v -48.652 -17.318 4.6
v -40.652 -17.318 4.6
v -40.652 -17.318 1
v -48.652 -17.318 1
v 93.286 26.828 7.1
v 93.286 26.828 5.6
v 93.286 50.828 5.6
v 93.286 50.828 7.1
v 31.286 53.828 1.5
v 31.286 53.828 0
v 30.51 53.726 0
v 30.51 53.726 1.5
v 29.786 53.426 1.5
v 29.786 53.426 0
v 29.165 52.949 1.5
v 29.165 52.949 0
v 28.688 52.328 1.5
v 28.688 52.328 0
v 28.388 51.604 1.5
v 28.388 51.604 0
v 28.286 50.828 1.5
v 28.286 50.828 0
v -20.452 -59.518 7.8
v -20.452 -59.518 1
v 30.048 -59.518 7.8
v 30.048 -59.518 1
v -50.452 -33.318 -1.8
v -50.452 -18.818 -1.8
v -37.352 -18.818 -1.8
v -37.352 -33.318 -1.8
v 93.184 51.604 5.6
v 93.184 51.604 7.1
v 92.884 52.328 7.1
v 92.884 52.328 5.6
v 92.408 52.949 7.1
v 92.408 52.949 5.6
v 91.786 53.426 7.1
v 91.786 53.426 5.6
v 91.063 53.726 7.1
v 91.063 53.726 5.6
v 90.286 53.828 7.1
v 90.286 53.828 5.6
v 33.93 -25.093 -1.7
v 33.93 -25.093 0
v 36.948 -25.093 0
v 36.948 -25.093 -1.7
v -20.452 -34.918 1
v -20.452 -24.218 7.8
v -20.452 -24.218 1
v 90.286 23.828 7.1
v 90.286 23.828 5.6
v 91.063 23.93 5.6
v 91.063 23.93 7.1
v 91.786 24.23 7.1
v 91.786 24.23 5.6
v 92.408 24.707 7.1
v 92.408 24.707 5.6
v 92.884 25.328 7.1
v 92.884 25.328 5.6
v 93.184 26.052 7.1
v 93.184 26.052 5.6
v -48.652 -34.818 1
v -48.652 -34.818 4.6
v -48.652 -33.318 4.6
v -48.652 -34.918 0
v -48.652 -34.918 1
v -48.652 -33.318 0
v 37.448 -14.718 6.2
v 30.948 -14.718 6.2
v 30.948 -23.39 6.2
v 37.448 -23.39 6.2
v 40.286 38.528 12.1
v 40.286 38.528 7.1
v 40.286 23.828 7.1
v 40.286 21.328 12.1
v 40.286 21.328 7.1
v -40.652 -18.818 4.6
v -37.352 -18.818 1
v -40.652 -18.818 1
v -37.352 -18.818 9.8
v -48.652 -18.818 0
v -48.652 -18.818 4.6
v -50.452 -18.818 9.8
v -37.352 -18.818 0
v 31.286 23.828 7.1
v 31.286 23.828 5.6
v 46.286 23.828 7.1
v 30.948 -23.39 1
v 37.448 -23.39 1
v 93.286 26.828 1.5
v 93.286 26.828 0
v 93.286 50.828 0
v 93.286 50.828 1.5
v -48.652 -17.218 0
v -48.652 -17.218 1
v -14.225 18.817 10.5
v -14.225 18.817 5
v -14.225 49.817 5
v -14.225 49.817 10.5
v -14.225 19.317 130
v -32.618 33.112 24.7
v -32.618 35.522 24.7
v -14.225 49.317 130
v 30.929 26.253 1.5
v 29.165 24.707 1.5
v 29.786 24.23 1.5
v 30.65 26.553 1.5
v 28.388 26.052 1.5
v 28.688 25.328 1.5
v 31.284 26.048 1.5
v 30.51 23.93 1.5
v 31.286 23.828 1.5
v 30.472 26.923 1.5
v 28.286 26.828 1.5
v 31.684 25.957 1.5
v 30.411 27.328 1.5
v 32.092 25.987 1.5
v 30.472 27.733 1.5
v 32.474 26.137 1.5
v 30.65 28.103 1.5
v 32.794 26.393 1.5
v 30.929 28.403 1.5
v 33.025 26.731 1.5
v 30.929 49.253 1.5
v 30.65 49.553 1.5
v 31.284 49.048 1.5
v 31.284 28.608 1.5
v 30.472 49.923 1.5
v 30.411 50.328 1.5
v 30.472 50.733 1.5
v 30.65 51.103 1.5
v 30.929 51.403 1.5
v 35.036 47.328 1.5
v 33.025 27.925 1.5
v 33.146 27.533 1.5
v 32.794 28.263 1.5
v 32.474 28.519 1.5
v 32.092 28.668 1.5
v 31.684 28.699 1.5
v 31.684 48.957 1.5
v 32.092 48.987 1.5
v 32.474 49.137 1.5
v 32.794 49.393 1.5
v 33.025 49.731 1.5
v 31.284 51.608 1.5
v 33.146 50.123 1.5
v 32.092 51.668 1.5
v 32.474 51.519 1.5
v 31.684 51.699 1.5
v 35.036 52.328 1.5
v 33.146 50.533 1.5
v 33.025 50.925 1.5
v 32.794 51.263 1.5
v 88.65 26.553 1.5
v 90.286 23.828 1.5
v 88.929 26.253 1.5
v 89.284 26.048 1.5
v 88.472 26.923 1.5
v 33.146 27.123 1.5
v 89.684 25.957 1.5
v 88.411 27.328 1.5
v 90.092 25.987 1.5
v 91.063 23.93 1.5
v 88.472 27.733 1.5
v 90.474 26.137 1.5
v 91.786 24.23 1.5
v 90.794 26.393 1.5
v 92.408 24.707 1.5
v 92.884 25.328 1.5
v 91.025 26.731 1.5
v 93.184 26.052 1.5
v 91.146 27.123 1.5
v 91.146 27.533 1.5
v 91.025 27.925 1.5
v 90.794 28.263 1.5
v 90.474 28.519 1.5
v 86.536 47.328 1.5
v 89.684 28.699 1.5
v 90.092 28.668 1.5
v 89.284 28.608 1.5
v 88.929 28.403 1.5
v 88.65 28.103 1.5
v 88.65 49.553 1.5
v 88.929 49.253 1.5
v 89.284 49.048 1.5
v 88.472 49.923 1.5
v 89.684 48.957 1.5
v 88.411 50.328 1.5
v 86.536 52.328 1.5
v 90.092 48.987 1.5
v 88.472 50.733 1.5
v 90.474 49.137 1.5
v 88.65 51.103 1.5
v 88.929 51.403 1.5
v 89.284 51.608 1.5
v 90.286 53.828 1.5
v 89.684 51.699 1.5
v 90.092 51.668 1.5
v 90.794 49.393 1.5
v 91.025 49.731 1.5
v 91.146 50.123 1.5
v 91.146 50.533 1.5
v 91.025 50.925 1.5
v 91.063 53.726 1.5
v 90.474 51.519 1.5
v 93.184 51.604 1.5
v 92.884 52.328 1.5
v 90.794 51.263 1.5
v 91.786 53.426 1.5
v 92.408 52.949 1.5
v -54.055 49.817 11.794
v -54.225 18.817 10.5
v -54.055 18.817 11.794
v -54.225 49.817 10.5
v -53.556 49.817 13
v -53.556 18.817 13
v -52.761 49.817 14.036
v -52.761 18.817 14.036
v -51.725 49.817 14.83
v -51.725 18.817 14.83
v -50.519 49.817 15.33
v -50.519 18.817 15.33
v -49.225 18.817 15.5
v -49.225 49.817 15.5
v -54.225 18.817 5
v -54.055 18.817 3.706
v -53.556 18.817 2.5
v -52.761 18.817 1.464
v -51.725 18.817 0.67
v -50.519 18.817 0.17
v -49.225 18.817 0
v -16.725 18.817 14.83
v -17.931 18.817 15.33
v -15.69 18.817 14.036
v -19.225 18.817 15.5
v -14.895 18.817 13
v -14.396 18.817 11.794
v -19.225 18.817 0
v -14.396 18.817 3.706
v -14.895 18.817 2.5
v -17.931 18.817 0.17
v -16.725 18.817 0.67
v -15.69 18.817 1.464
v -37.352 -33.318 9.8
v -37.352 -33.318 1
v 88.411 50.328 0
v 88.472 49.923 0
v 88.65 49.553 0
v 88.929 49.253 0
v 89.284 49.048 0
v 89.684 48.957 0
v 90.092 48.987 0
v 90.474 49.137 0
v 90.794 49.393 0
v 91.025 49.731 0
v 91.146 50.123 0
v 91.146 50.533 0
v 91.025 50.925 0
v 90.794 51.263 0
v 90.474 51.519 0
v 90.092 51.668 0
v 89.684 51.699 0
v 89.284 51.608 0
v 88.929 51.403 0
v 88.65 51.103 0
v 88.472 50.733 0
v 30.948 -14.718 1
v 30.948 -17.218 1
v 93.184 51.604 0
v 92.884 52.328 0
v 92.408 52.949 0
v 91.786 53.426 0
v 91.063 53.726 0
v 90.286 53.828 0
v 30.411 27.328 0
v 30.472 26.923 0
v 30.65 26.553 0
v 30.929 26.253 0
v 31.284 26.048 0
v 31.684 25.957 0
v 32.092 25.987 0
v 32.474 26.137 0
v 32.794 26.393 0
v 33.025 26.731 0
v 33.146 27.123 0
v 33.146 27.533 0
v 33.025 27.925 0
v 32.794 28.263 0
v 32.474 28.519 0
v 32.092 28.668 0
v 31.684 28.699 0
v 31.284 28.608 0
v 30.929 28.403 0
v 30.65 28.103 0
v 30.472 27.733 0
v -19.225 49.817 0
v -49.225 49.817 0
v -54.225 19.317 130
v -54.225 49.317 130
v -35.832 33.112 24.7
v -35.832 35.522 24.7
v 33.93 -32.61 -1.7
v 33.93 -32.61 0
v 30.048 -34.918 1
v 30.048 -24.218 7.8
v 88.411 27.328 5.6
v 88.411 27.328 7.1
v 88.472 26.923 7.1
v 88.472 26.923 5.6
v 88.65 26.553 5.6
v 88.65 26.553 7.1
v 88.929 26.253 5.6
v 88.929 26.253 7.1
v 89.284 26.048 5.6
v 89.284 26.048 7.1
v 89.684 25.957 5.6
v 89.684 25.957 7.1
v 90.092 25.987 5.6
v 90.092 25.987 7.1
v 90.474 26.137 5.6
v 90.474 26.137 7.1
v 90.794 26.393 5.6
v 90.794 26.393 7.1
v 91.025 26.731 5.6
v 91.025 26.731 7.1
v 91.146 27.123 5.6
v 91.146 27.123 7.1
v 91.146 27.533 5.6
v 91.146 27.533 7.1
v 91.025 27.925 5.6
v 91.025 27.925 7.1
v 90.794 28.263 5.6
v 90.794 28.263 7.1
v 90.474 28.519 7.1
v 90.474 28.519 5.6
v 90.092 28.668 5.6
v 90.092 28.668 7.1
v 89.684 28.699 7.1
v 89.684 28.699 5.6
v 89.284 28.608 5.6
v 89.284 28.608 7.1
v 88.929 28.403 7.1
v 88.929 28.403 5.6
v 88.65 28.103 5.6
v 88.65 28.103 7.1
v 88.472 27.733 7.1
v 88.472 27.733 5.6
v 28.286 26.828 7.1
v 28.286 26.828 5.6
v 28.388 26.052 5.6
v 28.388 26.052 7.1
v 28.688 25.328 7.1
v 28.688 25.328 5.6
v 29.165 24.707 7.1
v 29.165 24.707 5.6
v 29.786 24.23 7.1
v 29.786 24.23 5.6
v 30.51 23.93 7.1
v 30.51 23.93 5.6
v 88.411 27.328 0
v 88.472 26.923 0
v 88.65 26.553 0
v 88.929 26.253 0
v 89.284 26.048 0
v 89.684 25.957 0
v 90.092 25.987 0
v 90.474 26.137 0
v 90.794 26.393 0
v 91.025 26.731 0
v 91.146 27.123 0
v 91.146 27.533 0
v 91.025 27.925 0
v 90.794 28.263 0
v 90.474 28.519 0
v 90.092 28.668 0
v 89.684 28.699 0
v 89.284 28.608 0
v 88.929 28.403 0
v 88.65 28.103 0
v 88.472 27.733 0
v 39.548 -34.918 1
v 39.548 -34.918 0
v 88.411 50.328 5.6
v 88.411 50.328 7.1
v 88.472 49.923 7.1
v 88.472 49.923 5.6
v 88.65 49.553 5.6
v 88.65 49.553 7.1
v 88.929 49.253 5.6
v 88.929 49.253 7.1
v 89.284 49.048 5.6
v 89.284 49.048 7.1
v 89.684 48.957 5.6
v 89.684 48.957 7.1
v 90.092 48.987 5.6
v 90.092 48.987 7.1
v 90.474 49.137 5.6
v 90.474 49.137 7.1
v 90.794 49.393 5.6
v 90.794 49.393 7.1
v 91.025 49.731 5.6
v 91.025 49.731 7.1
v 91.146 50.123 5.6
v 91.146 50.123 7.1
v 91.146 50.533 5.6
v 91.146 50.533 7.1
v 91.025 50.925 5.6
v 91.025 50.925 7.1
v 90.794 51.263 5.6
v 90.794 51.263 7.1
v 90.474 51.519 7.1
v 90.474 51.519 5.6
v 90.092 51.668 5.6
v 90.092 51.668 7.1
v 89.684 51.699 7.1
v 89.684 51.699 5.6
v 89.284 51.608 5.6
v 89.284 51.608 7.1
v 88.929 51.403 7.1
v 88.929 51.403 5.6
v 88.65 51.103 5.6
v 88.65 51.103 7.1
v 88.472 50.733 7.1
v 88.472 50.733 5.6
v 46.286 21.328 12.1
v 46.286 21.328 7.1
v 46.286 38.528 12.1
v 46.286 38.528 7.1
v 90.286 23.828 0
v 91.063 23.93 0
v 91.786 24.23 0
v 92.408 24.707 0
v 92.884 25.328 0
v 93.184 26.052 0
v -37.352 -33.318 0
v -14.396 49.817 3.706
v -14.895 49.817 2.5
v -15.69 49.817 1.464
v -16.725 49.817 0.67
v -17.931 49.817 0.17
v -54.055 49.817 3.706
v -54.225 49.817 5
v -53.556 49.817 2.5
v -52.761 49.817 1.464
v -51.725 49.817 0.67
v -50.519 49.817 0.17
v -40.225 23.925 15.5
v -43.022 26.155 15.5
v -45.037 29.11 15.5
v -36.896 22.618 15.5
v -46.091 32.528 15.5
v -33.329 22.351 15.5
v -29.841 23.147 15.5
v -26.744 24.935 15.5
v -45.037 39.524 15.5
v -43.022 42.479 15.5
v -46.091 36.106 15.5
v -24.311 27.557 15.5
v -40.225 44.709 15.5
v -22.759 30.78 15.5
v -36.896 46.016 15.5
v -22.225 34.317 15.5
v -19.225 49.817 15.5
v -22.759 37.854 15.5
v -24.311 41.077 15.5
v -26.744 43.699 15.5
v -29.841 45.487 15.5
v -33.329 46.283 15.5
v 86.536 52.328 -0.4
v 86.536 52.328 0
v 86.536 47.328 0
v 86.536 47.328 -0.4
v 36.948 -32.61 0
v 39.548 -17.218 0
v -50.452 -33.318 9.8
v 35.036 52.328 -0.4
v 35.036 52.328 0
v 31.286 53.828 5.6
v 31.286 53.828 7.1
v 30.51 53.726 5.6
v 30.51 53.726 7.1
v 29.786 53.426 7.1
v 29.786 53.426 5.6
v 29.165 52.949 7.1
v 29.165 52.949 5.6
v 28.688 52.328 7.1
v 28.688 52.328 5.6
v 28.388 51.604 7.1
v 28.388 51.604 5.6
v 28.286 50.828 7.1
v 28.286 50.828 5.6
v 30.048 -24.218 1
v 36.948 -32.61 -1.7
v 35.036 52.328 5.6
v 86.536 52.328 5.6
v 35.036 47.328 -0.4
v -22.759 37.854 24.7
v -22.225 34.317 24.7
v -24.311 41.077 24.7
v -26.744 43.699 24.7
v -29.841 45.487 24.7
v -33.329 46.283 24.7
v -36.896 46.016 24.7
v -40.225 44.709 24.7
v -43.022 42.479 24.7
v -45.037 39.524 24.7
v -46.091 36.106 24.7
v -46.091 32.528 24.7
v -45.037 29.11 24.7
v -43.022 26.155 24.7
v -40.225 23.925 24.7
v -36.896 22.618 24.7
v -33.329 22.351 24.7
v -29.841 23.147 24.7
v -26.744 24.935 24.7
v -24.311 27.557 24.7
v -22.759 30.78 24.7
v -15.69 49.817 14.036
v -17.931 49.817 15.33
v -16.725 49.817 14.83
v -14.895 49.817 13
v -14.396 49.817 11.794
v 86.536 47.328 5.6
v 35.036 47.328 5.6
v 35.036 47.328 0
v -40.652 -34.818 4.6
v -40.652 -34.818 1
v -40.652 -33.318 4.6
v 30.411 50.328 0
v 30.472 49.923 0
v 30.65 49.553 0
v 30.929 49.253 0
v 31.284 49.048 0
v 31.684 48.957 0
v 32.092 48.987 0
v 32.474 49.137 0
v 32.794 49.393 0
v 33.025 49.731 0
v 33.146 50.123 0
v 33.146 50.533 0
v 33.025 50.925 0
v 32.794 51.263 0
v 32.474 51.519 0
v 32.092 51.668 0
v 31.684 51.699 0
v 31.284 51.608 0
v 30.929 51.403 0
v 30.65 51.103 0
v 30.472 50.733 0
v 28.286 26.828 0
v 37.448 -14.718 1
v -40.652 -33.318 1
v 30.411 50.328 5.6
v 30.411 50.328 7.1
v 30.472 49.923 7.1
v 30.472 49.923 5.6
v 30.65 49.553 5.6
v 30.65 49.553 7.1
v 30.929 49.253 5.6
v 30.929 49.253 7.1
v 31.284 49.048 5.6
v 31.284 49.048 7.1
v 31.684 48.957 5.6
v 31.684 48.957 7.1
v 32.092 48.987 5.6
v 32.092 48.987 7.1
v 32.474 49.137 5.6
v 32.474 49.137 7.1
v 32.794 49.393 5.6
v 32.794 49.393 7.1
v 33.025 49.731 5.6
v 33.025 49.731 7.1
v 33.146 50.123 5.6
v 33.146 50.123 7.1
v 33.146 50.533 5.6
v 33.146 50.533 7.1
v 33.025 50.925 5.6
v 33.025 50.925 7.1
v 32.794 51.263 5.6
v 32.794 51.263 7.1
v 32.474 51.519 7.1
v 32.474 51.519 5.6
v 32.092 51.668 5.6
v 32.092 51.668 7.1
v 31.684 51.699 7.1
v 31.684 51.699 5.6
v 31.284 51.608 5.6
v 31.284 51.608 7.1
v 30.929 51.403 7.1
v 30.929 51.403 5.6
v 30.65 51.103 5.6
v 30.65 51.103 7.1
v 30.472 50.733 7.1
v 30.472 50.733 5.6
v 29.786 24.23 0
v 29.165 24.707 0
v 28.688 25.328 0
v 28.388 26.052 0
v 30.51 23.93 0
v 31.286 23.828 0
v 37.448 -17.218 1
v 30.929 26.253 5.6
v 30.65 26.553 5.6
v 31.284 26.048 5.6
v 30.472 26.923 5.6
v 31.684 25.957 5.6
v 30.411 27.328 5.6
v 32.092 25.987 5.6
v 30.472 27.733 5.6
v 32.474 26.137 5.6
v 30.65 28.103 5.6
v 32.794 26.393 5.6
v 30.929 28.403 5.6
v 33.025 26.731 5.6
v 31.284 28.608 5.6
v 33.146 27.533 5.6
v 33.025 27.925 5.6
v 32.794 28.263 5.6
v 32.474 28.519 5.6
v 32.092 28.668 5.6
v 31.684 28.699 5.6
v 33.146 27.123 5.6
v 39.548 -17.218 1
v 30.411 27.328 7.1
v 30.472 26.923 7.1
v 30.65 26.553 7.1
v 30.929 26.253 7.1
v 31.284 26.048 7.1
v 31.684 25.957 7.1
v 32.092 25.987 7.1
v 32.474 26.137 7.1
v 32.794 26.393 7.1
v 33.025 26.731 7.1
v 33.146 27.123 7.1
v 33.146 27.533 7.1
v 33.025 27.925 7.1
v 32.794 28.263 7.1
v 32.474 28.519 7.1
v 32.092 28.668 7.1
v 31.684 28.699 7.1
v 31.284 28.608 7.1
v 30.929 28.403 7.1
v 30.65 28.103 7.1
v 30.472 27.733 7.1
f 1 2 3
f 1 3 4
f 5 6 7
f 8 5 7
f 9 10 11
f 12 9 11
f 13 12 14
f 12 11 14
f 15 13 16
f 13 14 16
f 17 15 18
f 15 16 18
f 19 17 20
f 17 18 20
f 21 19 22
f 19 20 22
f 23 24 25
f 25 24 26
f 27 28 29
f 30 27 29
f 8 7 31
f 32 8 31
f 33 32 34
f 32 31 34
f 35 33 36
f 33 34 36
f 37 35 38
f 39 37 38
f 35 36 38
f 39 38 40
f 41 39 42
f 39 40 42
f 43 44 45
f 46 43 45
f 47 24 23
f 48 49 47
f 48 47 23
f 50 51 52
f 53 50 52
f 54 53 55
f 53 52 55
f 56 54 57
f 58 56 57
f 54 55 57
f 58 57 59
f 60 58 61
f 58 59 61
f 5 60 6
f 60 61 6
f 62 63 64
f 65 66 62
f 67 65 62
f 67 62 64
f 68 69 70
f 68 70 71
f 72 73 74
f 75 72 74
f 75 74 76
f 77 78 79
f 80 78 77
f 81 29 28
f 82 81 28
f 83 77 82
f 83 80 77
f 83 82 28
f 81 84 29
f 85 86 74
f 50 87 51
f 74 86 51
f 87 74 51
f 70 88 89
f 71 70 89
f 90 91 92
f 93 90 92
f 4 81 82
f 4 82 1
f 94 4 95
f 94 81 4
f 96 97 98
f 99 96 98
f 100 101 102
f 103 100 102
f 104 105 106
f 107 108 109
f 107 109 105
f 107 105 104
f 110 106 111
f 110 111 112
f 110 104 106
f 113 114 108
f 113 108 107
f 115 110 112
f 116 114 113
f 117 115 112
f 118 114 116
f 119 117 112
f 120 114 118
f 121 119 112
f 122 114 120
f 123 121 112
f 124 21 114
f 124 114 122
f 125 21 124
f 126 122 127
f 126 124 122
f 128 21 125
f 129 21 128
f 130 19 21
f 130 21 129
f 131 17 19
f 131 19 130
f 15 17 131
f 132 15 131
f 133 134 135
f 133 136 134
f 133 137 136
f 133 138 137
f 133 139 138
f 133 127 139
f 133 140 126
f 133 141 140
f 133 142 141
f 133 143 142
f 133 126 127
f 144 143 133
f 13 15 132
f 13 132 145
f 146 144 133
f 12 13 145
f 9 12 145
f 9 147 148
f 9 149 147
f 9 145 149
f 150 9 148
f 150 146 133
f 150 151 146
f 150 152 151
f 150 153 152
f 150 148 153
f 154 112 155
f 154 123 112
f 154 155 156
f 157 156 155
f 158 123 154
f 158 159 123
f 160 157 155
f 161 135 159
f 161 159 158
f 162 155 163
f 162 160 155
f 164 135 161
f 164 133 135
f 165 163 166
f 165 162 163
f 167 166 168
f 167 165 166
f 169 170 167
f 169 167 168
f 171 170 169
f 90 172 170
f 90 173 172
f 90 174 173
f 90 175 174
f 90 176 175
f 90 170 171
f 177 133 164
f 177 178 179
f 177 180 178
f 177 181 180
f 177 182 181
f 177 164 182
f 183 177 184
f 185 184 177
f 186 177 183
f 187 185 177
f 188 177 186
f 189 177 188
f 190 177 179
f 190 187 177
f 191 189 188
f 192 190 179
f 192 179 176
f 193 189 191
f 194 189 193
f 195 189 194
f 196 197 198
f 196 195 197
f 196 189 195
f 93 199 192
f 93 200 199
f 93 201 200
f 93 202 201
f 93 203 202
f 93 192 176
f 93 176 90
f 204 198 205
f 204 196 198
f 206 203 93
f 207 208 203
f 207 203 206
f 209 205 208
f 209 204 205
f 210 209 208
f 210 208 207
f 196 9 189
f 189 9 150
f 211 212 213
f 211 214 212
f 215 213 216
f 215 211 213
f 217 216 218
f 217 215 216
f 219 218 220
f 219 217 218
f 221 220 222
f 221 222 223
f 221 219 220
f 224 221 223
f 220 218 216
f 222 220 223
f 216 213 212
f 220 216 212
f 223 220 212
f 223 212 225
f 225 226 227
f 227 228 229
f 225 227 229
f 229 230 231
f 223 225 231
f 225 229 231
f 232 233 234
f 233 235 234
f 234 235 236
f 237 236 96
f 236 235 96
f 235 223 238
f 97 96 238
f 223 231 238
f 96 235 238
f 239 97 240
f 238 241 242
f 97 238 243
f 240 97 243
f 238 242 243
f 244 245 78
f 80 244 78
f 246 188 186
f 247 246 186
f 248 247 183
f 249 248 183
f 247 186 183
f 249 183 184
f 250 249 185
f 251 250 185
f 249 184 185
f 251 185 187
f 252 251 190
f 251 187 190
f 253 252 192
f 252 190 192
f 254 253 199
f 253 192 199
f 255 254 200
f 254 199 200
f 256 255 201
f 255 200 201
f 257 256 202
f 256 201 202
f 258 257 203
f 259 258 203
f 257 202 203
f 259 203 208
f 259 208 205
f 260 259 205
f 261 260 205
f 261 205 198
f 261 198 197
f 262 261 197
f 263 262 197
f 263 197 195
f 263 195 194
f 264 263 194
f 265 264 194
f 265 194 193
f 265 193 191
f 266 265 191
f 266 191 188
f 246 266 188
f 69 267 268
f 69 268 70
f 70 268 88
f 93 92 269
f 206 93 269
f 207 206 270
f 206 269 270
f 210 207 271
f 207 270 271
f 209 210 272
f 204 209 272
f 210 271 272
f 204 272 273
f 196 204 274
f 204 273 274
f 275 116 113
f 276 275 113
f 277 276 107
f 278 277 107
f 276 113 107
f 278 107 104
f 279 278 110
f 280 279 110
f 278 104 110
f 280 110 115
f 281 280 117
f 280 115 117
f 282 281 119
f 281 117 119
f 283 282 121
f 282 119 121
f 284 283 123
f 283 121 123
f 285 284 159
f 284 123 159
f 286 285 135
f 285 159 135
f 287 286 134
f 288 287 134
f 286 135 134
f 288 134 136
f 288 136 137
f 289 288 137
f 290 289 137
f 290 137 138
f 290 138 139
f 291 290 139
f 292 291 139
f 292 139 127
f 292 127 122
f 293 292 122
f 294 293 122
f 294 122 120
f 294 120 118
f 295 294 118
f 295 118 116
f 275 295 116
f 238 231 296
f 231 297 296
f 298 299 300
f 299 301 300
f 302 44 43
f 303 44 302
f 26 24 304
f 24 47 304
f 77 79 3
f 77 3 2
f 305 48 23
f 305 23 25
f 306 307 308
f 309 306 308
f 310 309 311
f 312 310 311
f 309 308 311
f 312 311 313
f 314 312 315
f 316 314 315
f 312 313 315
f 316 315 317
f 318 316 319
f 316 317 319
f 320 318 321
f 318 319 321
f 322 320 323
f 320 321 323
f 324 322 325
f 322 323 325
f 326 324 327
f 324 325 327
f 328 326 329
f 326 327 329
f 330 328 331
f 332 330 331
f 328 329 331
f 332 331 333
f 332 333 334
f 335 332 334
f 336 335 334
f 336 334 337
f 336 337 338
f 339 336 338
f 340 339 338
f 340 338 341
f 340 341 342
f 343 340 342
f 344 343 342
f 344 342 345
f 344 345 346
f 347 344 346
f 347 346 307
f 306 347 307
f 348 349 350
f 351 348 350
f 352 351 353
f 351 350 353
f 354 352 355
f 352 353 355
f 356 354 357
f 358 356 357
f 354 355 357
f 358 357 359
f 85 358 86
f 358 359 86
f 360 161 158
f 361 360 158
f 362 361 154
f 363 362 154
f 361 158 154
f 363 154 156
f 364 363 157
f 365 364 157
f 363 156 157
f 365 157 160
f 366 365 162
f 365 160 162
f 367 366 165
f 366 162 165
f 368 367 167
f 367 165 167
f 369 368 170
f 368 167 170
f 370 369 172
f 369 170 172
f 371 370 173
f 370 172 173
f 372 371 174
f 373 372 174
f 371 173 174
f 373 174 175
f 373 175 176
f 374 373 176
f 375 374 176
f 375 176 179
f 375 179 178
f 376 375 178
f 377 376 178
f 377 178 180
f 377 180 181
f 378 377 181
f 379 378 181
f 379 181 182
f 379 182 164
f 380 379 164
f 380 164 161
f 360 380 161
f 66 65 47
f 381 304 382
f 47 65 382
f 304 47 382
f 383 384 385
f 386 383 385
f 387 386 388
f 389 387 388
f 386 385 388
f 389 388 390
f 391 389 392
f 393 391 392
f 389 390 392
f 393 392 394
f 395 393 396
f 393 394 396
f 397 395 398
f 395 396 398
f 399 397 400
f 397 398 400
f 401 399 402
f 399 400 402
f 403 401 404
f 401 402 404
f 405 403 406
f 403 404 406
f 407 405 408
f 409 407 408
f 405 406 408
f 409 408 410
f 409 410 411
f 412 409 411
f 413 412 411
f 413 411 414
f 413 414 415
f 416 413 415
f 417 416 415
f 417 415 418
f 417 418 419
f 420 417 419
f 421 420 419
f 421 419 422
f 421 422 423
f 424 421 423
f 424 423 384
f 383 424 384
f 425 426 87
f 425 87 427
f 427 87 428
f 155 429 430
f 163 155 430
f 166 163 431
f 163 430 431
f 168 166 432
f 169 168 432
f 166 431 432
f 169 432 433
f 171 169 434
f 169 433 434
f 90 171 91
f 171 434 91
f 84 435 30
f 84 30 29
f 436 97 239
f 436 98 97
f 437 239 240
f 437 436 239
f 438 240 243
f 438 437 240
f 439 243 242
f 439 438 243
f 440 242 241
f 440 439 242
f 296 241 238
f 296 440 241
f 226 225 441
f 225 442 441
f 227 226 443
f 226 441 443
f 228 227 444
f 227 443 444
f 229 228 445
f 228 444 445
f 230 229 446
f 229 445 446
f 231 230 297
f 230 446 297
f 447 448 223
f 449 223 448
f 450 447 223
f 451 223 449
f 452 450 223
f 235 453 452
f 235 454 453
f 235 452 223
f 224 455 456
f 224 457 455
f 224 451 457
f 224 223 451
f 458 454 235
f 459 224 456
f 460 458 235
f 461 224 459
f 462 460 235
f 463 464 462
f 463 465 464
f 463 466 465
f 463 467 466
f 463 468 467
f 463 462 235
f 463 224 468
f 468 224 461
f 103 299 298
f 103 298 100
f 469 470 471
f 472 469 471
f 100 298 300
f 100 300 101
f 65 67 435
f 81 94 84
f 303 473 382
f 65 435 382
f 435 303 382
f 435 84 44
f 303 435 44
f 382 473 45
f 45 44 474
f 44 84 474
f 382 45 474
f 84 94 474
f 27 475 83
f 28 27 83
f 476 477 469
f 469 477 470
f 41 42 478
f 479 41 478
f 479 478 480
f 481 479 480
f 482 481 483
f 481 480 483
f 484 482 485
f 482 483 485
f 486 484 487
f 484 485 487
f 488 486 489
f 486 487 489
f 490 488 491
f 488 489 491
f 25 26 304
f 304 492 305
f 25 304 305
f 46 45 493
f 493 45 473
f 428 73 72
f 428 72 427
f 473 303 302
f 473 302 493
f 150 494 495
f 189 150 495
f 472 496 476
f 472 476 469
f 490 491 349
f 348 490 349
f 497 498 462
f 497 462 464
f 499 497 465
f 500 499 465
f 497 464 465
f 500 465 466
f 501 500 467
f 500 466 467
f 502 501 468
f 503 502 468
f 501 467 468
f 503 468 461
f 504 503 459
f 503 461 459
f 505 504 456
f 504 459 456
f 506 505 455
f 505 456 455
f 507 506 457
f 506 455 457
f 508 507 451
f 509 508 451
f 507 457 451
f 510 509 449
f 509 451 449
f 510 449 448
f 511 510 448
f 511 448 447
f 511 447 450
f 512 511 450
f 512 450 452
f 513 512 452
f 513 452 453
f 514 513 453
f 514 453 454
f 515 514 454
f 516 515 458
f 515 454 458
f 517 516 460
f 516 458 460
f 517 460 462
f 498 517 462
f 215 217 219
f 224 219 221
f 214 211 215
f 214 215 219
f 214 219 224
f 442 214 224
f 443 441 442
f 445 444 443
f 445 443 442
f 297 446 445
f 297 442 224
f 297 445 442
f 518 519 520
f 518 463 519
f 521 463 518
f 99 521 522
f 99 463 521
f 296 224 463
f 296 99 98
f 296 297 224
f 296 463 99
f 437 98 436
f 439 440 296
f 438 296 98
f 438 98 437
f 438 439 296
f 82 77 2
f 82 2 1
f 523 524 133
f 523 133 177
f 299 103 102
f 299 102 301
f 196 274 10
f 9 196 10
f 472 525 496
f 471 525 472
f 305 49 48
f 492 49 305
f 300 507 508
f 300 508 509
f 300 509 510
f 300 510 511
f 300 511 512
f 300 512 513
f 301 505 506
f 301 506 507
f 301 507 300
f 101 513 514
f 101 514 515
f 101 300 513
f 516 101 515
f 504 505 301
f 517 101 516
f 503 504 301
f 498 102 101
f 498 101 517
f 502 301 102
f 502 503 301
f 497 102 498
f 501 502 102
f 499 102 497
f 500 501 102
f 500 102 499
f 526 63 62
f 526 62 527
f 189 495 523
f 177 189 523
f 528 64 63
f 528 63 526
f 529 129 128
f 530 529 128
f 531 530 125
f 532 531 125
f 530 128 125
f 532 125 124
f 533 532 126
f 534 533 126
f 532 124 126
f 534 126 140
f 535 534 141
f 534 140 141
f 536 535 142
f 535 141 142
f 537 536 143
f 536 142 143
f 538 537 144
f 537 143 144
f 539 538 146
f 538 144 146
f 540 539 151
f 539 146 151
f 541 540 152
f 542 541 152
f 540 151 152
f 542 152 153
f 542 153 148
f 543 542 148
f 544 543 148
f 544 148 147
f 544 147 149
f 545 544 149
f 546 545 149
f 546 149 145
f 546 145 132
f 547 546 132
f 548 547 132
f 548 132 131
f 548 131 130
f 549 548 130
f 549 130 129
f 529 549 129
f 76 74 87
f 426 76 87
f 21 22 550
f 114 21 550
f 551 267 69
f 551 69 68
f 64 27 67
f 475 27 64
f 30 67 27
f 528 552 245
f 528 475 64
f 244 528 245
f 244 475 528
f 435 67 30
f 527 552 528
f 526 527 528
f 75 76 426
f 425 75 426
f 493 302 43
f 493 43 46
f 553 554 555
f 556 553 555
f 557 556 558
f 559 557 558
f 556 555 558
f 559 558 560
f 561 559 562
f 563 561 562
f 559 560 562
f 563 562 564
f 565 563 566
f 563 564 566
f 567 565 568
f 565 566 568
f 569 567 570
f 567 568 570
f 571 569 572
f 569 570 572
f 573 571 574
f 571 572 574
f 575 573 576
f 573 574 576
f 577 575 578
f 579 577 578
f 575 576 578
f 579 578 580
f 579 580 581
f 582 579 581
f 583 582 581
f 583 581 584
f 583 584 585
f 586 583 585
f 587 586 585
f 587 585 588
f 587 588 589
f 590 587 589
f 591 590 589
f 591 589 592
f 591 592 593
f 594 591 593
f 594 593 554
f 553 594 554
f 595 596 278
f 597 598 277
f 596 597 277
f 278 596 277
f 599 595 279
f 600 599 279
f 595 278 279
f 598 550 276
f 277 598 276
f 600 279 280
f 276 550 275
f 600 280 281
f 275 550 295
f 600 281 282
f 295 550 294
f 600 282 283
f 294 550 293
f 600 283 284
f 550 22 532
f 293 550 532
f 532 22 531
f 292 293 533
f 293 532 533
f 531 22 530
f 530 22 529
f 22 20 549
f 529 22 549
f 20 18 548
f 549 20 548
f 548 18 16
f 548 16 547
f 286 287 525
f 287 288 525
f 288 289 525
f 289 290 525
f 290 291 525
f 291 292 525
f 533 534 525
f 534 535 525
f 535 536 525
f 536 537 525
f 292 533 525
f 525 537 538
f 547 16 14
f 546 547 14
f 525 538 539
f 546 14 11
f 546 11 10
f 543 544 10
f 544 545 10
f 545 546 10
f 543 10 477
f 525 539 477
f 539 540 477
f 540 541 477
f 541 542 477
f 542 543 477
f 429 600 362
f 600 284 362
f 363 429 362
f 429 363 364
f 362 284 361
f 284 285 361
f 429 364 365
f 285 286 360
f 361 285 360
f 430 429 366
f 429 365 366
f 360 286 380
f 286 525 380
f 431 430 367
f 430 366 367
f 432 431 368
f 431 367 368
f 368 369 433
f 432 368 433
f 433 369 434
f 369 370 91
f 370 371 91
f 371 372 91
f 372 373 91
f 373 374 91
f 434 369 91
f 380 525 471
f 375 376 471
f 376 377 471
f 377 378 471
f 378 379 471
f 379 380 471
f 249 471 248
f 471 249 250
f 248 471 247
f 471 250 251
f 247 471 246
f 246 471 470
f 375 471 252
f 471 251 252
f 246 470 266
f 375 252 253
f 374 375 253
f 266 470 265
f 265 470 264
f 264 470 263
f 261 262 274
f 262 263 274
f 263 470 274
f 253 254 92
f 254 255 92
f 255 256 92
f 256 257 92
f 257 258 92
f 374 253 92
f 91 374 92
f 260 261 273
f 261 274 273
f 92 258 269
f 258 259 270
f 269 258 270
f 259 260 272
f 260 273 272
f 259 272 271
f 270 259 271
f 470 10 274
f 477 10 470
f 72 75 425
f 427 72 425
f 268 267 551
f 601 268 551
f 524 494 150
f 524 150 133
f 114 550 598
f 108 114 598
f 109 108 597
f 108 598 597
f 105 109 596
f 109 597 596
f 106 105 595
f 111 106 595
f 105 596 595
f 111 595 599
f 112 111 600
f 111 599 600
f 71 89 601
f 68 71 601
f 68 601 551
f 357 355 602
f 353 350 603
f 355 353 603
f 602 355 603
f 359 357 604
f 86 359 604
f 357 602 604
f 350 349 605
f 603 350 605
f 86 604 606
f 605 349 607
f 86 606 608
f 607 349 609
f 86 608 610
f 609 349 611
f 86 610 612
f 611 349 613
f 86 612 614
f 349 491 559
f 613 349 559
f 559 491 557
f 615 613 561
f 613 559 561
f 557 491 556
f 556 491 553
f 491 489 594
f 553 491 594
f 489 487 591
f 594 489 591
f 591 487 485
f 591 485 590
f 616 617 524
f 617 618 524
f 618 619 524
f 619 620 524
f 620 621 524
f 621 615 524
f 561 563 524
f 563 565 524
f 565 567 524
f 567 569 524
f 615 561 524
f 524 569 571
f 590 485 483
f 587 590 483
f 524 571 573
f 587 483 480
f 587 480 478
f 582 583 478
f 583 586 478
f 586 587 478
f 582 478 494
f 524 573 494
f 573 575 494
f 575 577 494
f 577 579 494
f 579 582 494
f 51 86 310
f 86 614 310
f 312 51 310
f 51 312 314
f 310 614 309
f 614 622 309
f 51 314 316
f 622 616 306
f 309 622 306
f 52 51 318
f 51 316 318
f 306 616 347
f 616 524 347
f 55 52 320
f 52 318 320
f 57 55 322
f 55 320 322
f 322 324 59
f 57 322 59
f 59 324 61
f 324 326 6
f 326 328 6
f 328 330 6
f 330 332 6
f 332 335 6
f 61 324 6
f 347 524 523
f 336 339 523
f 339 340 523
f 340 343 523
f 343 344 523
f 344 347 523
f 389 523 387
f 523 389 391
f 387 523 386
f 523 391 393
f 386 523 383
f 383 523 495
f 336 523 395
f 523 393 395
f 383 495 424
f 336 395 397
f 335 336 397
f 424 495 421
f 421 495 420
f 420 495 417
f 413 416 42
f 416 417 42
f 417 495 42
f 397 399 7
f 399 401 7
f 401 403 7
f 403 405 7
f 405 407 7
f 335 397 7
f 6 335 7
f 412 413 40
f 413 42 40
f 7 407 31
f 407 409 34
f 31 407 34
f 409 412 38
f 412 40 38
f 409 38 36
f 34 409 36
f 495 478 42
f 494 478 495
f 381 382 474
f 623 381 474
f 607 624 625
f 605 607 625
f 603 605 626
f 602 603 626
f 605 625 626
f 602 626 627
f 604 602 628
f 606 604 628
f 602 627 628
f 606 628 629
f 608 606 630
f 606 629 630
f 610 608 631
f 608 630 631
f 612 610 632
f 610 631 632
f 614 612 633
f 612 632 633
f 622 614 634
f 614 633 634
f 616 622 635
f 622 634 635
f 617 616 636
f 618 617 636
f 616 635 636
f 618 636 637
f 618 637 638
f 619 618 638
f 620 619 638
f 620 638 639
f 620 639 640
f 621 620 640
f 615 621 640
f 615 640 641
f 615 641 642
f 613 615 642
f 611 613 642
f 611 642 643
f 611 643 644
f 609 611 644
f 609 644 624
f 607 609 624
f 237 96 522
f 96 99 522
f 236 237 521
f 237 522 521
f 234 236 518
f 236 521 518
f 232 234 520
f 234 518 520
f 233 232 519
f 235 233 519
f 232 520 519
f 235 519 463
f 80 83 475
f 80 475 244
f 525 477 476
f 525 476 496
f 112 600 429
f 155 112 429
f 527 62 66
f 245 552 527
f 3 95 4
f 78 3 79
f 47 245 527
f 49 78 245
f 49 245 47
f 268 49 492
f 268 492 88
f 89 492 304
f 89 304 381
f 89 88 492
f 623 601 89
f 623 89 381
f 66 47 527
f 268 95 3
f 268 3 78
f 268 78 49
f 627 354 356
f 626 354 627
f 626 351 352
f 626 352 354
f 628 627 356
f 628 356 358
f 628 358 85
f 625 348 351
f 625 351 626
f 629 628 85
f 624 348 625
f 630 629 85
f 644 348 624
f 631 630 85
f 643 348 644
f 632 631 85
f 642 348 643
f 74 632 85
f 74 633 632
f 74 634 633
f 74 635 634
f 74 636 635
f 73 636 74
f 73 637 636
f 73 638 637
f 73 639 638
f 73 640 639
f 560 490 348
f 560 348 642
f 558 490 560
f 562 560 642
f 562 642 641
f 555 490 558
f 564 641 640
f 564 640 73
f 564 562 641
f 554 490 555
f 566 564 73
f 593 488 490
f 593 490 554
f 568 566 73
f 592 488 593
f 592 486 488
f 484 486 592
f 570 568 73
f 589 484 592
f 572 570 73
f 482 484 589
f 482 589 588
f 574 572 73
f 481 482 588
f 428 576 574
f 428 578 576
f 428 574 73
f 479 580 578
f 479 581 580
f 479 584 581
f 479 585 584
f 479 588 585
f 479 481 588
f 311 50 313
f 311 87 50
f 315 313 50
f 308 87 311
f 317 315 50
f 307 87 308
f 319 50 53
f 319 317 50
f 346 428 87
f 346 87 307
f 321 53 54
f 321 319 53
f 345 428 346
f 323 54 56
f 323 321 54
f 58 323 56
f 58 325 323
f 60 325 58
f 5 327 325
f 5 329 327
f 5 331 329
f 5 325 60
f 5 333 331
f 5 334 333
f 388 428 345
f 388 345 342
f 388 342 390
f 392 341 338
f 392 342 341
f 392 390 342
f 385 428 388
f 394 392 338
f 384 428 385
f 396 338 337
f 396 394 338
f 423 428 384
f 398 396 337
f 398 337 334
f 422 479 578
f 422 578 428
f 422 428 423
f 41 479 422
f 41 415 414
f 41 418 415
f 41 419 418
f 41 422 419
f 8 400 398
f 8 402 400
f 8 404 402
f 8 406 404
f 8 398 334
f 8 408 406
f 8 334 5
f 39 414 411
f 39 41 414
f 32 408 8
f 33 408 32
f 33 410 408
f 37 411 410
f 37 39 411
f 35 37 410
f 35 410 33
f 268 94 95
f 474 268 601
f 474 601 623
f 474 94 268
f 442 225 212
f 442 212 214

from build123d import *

# Parameters (mm, degrees)
F0_W      = 40
F0_H      = 31
F1_DEPTH  = 15.5
F2_R      = 5
F3_R      = 12
F4_DEPTH  = 9.2
F5_W      = 88.2
F5_H      = 17.7
F6_DEPTH  = 1
F7_W      = 50.5
F7_H      = 2.8
F7_H_2    = 10.7
F8_DEPTH  = 6.8
F9_DEPTH  = 21.8
F10_W     = 1.8
F10_H     = 14.5
F10_W_2   = 11.3
F11_DEPTH = 8.8
F12_DEPTH = 2.8
F13_W     = 6.5
F13_H     = 2.5
F13_H_2   = 6.1723221527
F14_DEPTH = 5.2
F15_W     = 3.0176565558
F15_H     = 7.5164381415
F16_DEPTH = 1.7
F18_DEPTH = 1.5
F21_DEPTH = 1.5
F22_D     = 2.75
F22_2_D   = 2.75
F23_W     = 51.5
F23_H     = 5
F24_DEPTH = 6
F25_W     = 6
F25_H     = 2.5
F25_H_2   = 14.7
F26_DEPTH = 5
F30_W     = 40
F30_H     = 30
F32_W     = 8
F32_H     = 3.6
F33_W     = 8
F33_H     = 3.6
F34_DEPTH = 1.5


with BuildPart() as f1:
    # F0 (on Top) → F1 (new body)
    with BuildSketch(Plane.XY):
        with Locations((-34.2253973186, 34.3170047009)):
            Rectangle(F0_W, F0_H)
    extrude(amount=F1_DEPTH)

    # F2
    f2_edges = [f1.edges().sort_by_distance(p)[0] for p in [
        (-14.225397, 34.317005, 15.5),
        (-54.225397, 34.317005, 15.5),
        (-54.225397, 34.317005, 0),
        (-14.225397, 34.317005, 0),
    ]]
    fillet(f2_edges, radius=F2_R)

    # F3 (on face) → F4 (join)
    with BuildSketch(Plane.XY.offset(15.5)):
        with Locations((-34.2253973186, 34.3170047009)):
            Circle(F3_R)
    extrude(amount=F4_DEPTH)

    # F30 (on offset) → F31 section 0
    with BuildSketch(Plane.XY.offset(130), mode=Mode.PRIVATE) as f31_s0:
        with Locations((-34.2253973186, 34.3170047009)):
            Rectangle(F30_W, F30_H)
    loft([f31_s0.sketch, Vertex(-34.2253973186, 34.3170047009, 15.5)])


with BuildPart() as f6:
    # F5 (on Top) → F6 (new body)
    with BuildSketch(Plane.XY):
        with Locations((-4.5524329334, -26.0675935584)):
            Rectangle(F5_W, F5_H)
    extrude(amount=F6_DEPTH)

    # F7 (on face) → F8 (join)
    with BuildSketch(Plane.XY.offset(1)):
        with Locations((4.7975670666, -36.3175935584)):
            Rectangle(F7_W, F7_H)
        with Locations((4.7975670666, -29.5675935584)):
            Rectangle(F7_W, F7_H_2)
    extrude(amount=F8_DEPTH)

    # F9 (add): a face of the model
    f9_faces = [f6.faces().sort_by_distance(p)[0] for p in [
        (4.7975670666, -37.7175935584, 4.4),
    ]]
    extrude(f9_faces, amount=F9_DEPTH)

    # F10 (on face) → F11 (join)
    with BuildSketch(Plane.XY.offset(1)):
        with Locations((-49.5524329334, -26.0675935584)):
            Rectangle(F10_W, F10_H)
        with Locations((-43.0024329334, -26.0675935584)):
            Rectangle(F10_W_2, F10_H)
    extrude(amount=F11_DEPTH)

    # F10 (on face) → F12 (join)
    with BuildSketch(Plane.XY.offset(1)):
        with Locations((-49.5524329334, -26.0675935584)):
            Rectangle(F10_W, F10_H)
        with Locations((-43.0024329334, -26.0675935584)):
            Rectangle(F10_W_2, F10_H)
    extrude(amount=-F12_DEPTH)

    # F13 (on face) → F14 (join)
    with BuildSketch(Plane.XY.offset(1)):
        with Locations((34.1975670666, -15.9675935584)):
            Rectangle(F13_W, F13_H)
        with Locations((34.1975670666, -20.3037546347)):
            Rectangle(F13_W, F13_H_2)
    extrude(amount=F14_DEPTH)

    # F15 (on face) → F16 (join)
    with BuildSketch(Plane(origin=(0, 0, 0), x_dir=(1, 0, 0), z_dir=(0, 0, -1))):
        with Locations((35.4387387887, 28.8513666019)):
            Rectangle(F15_W, F15_H)
    extrude(amount=F16_DEPTH)

    # F32 (on face) + F33 (on face) → F34 (join, symmetric)
    with BuildSketch(Plane.XZ.offset(33.3175935584)):
        with Locations((-44.6524329334, 2.8)):
            Rectangle(F32_W, F32_H)
    with BuildSketch(Plane(origin=(0, -18.8175935584, 0), x_dir=(-1, 0, 0), z_dir=(0, 1, 0))):
        with Locations((44.6524329334, 2.8)):
            Rectangle(F33_W, F33_H)
    extrude(amount=F34_DEPTH, both=True, dir=(0, -1, 0))


with BuildPart() as f18:
    # F17 (on Top) → F18 (new body)
    with BuildSketch(Plane.XY):
        with BuildLine():
            Line((90.2862745896, 53.8279704224), (31.2862745896, 53.8279704224))
            ThreePointArc((31.2862745896, 53.8279704224), (29.164954246, 52.949290766), (28.2862745896, 50.8279704224))
            Line((28.2862745896, 50.8279704224), (28.2862745896, 26.8279704224))
            ThreePointArc((28.2862745896, 26.8279704224), (29.164954246, 24.7066500788), (31.2862745896, 23.8279704224))
            Line((31.2862745896, 23.8279704224), (90.2862745896, 23.8279704224))
            ThreePointArc((90.2862745896, 23.8279704224), (92.4075949332, 24.7066500788), (93.2862745896, 26.8279704224))
            Line((93.2862745896, 26.8279704224), (93.2862745896, 50.8279704224))
            ThreePointArc((93.2862745896, 50.8279704224), (92.4075949332, 52.949290766), (90.2862745896, 53.8279704224))
        make_face()
    extrude(amount=F18_DEPTH)

    # F22 (through all)
    with Locations(Plane(origin=(0, 0, 0), x_dir=(1, 0, 0), z_dir=(0, 0, -1))):
        with Locations((31.7862745896, -50.3279704224), (31.7862745896, -27.3279704224), (89.7862745896, -27.3279704224), (89.7862745896, -50.3279704224)):
            Hole(F22_D / 2)



with BuildPart() as f21:
    # F20 (on offset) → F21 (new body)
    with BuildSketch(Plane.XY.offset(5.6)):
        with BuildLine():
            Line((90.2862745896, 53.8279704224), (31.2862745896, 53.8279704224))
            ThreePointArc((31.2862745896, 53.8279704224), (29.164954246, 52.949290766), (28.2862745896, 50.8279704224))
            Line((28.2862745896, 50.8279704224), (28.2862745896, 26.8279704224))
            ThreePointArc((28.2862745896, 26.8279704224), (29.164954246, 24.7066500788), (31.2862745896, 23.8279704224))
            Line((31.2862745896, 23.8279704224), (90.2862745896, 23.8279704224))
            ThreePointArc((90.2862745896, 23.8279704224), (92.4075949332, 24.7066500788), (93.2862745896, 26.8279704224))
            Line((93.2862745896, 26.8279704224), (93.2862745896, 50.8279704224))
            ThreePointArc((93.2862745896, 50.8279704224), (92.4075949332, 52.949290766), (90.2862745896, 53.8279704224))
        make_face()
    extrude(amount=F21_DEPTH)

    # F22#2 (through all)
    with Locations(Plane(origin=(0, 0, 0), x_dir=(1, 0, 0), z_dir=(0, 0, -1))):
        with Locations((31.7862745896, -50.3279704224), (31.7862745896, -27.3279704224), (89.7862745896, -27.3279704224), (89.7862745896, -50.3279704224)):
            Hole(F22_2_D / 2)


with BuildPart() as f18_1:
    add(f18.part)

    add(f21.part)  # F24 merges F21
    # F23 (on face) → F24 (join)
    with BuildSketch(Plane(origin=(0, 0, 5.6), x_dir=(1, 0, 0), z_dir=(0, 0, -1))):
        with Locations((60.7862745896, -49.8279704224)):
            Rectangle(F23_W, F23_H)
    extrude(amount=F24_DEPTH)

    # F25 (on face) → F26 (join)
    with BuildSketch(Plane.XY.offset(7.1)):
        with Locations((43.2862745896, 22.5779704224)):
            Rectangle(F25_W, F25_H)
        with Locations((43.2862745896, 31.1779704224)):
            Rectangle(F25_W, F25_H_2)
    extrude(amount=F26_DEPTH)


solid = Compound([f1.part, f6.part, f18_1.part])
